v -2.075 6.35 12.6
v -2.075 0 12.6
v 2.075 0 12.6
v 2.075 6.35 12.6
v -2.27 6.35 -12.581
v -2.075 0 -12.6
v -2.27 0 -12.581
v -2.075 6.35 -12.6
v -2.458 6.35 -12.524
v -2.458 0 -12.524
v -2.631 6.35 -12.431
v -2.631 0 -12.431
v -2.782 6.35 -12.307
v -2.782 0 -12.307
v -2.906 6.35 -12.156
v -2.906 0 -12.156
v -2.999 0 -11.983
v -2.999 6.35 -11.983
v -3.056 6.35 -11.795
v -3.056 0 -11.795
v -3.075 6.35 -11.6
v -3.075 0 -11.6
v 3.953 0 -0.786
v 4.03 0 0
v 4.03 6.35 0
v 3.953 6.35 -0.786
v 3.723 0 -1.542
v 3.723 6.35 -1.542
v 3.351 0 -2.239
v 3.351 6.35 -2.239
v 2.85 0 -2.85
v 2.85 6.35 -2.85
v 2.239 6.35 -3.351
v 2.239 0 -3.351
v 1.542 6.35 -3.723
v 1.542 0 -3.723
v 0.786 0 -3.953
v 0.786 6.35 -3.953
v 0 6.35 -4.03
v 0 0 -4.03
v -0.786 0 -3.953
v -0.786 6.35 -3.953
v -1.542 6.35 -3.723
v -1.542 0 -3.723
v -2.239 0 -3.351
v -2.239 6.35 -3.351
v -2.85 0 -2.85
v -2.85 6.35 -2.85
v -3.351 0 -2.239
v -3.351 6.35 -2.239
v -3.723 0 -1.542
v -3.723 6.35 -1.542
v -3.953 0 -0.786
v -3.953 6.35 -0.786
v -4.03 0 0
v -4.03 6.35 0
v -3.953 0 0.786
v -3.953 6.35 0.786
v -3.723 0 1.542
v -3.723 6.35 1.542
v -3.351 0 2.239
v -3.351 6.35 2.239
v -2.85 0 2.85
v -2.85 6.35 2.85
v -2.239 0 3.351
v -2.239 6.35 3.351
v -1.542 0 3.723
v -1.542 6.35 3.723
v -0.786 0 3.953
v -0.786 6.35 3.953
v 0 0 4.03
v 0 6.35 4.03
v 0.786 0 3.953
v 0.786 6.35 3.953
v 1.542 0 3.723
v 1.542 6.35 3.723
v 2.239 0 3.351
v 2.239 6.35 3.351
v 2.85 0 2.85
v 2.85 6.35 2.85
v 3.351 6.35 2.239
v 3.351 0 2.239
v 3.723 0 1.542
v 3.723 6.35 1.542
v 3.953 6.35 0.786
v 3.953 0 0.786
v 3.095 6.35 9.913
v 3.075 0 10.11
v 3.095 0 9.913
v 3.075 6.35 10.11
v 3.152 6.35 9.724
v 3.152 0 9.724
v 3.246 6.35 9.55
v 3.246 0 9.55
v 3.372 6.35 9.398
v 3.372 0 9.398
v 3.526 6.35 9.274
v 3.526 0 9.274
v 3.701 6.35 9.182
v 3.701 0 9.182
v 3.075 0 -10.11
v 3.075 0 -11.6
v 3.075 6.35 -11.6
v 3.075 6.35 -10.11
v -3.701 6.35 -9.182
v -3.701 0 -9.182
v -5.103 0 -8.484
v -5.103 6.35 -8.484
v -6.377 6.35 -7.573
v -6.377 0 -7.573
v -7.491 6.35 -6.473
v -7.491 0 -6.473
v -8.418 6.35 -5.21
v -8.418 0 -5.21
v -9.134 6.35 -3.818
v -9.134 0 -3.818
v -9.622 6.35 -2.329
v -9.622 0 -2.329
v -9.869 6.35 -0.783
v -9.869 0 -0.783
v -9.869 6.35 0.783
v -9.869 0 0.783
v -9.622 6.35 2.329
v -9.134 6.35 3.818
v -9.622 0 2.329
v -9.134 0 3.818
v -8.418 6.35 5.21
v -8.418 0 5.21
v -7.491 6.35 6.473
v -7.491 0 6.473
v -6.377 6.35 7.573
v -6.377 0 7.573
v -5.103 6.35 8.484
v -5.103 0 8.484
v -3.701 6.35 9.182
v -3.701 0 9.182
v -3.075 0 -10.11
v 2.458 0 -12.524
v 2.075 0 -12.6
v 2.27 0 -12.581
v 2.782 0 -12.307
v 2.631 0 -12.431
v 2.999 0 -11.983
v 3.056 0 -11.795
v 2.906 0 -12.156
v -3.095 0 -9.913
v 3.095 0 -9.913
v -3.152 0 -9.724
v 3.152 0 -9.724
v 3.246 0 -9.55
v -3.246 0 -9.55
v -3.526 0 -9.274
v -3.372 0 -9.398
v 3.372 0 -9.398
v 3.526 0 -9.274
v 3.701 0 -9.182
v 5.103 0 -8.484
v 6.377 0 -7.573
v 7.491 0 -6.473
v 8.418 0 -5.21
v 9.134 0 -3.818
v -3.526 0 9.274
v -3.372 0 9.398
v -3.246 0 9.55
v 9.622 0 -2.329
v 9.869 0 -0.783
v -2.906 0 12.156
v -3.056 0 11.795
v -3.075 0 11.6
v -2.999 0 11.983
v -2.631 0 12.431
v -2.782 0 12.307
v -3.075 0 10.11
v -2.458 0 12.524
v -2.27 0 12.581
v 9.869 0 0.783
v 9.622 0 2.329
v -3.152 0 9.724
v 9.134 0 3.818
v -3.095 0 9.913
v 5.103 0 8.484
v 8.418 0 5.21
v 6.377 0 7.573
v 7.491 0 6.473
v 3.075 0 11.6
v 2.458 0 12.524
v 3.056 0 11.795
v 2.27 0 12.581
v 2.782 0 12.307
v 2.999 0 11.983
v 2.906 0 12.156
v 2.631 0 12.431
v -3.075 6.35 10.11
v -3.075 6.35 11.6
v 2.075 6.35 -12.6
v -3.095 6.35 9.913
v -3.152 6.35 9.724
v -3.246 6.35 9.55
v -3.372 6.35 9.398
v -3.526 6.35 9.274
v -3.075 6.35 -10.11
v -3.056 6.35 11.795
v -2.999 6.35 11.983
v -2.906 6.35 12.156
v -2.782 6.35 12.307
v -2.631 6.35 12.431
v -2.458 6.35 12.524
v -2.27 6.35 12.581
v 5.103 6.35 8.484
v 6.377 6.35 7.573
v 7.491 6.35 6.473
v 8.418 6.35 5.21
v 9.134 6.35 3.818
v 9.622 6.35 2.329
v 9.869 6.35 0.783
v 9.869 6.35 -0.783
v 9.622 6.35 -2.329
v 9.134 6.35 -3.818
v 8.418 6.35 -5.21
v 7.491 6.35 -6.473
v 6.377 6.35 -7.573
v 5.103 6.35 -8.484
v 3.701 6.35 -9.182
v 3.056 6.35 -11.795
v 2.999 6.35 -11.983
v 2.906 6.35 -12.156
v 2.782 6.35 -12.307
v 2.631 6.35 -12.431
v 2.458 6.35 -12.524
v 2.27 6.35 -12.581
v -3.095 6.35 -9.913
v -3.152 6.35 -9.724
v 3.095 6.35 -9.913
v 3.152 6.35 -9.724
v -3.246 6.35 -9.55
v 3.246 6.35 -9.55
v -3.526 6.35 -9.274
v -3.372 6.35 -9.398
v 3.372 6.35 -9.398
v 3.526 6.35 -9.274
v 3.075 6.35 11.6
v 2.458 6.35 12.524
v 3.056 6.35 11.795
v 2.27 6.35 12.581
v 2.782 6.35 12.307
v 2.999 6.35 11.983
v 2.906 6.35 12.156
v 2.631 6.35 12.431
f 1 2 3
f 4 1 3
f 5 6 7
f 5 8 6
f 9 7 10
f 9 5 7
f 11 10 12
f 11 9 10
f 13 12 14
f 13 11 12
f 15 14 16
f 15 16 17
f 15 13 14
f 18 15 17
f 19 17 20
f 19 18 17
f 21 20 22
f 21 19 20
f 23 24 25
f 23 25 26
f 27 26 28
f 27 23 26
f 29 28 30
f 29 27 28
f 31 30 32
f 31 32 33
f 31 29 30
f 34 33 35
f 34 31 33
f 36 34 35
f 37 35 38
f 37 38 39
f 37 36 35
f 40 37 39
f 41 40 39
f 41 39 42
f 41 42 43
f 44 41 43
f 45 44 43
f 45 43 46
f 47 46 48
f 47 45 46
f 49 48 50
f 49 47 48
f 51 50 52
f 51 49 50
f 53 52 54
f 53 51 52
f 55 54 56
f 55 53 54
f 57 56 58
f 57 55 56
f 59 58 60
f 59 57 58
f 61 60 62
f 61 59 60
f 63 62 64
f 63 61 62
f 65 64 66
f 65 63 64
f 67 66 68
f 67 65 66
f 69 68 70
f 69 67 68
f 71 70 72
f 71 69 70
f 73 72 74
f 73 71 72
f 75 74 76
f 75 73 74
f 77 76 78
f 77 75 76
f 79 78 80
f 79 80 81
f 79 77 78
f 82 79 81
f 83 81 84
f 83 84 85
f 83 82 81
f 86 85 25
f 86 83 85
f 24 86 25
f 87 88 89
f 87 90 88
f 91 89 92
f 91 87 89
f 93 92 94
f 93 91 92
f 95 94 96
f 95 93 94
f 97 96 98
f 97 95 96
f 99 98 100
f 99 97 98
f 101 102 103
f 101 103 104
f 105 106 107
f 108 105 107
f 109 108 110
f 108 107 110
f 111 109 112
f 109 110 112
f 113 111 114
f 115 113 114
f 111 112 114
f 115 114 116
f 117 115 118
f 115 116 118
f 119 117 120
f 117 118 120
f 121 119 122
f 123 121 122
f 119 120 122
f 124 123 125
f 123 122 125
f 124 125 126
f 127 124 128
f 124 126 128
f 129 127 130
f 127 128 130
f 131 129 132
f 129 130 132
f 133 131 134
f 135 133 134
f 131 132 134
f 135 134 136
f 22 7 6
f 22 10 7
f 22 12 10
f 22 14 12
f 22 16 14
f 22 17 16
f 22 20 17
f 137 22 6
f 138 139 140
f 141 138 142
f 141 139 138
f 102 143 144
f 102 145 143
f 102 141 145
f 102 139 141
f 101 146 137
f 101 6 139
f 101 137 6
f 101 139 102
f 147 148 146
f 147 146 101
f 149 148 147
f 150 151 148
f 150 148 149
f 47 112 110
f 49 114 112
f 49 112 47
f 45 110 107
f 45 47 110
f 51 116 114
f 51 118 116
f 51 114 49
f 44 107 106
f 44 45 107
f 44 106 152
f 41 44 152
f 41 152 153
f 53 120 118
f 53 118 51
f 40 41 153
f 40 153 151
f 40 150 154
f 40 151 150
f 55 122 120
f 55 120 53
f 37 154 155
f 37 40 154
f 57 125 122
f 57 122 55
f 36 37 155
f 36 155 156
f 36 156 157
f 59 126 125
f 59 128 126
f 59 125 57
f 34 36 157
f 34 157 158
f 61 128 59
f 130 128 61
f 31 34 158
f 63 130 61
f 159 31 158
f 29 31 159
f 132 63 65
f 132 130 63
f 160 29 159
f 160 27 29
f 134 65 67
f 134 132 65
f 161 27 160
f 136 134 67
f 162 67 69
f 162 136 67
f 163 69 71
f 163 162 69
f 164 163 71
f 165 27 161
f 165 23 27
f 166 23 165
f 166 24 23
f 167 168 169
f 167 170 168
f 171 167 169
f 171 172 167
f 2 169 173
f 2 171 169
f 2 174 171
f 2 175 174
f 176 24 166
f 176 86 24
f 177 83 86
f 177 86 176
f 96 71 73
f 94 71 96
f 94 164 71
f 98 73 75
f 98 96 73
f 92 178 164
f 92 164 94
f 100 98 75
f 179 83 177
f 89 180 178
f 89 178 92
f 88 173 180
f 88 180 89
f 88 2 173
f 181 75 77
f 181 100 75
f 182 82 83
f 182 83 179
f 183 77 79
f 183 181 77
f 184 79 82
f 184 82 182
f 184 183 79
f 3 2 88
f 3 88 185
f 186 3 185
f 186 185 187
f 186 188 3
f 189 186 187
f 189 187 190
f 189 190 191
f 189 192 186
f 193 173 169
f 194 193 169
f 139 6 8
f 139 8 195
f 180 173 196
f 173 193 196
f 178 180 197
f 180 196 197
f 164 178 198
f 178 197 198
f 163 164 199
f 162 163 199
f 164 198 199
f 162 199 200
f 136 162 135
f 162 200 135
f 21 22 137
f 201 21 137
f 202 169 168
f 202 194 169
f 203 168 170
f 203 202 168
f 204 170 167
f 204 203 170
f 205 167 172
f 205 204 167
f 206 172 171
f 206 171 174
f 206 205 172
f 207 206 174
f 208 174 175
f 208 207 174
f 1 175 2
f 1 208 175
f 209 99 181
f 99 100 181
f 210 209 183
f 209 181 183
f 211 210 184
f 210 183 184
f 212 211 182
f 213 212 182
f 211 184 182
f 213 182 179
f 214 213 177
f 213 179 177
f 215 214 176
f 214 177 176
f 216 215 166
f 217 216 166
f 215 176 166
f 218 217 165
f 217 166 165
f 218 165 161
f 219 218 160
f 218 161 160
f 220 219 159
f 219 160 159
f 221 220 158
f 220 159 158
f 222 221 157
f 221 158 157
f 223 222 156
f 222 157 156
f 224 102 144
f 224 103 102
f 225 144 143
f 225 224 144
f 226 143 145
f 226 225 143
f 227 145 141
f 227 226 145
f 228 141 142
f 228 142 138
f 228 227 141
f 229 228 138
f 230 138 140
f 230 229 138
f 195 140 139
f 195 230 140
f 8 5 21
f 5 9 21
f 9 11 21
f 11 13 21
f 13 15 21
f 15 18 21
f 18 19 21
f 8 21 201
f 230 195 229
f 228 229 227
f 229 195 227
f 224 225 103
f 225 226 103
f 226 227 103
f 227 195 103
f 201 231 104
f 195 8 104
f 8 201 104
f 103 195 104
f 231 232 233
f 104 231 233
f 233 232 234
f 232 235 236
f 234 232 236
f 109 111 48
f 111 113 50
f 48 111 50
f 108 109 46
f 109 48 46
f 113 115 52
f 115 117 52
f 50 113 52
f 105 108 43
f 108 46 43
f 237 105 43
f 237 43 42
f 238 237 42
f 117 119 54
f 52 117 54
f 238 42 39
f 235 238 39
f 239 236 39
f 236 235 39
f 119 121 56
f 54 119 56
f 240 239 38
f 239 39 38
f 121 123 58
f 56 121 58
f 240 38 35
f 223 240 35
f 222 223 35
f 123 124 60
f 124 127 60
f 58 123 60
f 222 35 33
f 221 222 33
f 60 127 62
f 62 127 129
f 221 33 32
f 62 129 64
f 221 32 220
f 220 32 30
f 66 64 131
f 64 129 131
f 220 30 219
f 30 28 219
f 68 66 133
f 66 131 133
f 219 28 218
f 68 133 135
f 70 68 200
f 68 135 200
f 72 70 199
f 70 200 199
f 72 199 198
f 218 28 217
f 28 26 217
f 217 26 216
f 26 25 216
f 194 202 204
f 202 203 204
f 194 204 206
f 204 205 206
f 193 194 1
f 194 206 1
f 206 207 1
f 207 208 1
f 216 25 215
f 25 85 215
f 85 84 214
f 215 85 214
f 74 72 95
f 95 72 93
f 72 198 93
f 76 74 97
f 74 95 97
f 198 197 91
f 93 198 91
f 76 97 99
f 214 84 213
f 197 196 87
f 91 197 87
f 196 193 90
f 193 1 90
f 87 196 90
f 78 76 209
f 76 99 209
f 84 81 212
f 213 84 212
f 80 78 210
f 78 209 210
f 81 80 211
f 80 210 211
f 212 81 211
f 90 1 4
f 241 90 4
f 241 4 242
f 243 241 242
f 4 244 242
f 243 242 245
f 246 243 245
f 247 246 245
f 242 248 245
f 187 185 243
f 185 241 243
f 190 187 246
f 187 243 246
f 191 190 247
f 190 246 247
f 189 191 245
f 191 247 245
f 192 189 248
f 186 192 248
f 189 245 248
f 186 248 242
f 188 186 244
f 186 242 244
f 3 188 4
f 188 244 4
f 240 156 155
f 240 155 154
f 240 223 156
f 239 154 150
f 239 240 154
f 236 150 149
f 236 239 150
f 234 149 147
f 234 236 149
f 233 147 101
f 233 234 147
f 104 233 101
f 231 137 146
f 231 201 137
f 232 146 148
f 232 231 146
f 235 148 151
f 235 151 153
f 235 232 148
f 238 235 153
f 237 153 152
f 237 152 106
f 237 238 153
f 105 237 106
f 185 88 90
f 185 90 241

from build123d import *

# Parameters (mm, degrees)
SKETCH1_R           = 9.9
SKETCH1_R_2         = 4.03
BOSS_EXTRUDE1_DEPTH = 6.35
SKETCH2_W           = 6.15
SKETCH2_H           = 3.189666584
BOSS_EXTRUDE2_DEPTH = 6.35
FILLET2_R           = 1


with BuildPart() as part:
    # Sketch1 → Boss-Extrude1 (new body)
    with BuildSketch(Plane(origin=(0, 0, 0), x_dir=(1, 0, 0), z_dir=(0, 1, 0))):
        Circle(SKETCH1_R)
        Circle(SKETCH1_R_2, mode=Mode.SUBTRACT)
    extrude(amount=BOSS_EXTRUDE1_DEPTH)

    # Sketch2 → Boss-Extrude2 (add, through all)
    with BuildSketch(Plane.XZ):
        with Locations((0, 11.005166708)):
            Rectangle(SKETCH2_W, SKETCH2_H)
        with Locations((0, -11.005166708)):
            Rectangle(SKETCH2_W, SKETCH2_H)
    extrude(amount=-BOSS_EXTRUDE2_DEPTH)

    # Fillet2
    fillet2_edges = [part.edges().sort_by_distance(p)[0] for p in [
        (-3.075, 3.175, 9.410333416),
        (-3.075, 3.175, 12.6),
        (3.075, 3.175, 12.6),
        (3.075, 3.175, 9.410333416),
        (-3.075, 3.175, -12.6),
        (-3.075, 3.175, -9.410333416),
        (3.075, 3.175, -9.410333416),
        (3.075, 3.175, -12.6),
    ]]
    fillet(fillet2_edges, radius=FILLET2_R)


solid = part.part
